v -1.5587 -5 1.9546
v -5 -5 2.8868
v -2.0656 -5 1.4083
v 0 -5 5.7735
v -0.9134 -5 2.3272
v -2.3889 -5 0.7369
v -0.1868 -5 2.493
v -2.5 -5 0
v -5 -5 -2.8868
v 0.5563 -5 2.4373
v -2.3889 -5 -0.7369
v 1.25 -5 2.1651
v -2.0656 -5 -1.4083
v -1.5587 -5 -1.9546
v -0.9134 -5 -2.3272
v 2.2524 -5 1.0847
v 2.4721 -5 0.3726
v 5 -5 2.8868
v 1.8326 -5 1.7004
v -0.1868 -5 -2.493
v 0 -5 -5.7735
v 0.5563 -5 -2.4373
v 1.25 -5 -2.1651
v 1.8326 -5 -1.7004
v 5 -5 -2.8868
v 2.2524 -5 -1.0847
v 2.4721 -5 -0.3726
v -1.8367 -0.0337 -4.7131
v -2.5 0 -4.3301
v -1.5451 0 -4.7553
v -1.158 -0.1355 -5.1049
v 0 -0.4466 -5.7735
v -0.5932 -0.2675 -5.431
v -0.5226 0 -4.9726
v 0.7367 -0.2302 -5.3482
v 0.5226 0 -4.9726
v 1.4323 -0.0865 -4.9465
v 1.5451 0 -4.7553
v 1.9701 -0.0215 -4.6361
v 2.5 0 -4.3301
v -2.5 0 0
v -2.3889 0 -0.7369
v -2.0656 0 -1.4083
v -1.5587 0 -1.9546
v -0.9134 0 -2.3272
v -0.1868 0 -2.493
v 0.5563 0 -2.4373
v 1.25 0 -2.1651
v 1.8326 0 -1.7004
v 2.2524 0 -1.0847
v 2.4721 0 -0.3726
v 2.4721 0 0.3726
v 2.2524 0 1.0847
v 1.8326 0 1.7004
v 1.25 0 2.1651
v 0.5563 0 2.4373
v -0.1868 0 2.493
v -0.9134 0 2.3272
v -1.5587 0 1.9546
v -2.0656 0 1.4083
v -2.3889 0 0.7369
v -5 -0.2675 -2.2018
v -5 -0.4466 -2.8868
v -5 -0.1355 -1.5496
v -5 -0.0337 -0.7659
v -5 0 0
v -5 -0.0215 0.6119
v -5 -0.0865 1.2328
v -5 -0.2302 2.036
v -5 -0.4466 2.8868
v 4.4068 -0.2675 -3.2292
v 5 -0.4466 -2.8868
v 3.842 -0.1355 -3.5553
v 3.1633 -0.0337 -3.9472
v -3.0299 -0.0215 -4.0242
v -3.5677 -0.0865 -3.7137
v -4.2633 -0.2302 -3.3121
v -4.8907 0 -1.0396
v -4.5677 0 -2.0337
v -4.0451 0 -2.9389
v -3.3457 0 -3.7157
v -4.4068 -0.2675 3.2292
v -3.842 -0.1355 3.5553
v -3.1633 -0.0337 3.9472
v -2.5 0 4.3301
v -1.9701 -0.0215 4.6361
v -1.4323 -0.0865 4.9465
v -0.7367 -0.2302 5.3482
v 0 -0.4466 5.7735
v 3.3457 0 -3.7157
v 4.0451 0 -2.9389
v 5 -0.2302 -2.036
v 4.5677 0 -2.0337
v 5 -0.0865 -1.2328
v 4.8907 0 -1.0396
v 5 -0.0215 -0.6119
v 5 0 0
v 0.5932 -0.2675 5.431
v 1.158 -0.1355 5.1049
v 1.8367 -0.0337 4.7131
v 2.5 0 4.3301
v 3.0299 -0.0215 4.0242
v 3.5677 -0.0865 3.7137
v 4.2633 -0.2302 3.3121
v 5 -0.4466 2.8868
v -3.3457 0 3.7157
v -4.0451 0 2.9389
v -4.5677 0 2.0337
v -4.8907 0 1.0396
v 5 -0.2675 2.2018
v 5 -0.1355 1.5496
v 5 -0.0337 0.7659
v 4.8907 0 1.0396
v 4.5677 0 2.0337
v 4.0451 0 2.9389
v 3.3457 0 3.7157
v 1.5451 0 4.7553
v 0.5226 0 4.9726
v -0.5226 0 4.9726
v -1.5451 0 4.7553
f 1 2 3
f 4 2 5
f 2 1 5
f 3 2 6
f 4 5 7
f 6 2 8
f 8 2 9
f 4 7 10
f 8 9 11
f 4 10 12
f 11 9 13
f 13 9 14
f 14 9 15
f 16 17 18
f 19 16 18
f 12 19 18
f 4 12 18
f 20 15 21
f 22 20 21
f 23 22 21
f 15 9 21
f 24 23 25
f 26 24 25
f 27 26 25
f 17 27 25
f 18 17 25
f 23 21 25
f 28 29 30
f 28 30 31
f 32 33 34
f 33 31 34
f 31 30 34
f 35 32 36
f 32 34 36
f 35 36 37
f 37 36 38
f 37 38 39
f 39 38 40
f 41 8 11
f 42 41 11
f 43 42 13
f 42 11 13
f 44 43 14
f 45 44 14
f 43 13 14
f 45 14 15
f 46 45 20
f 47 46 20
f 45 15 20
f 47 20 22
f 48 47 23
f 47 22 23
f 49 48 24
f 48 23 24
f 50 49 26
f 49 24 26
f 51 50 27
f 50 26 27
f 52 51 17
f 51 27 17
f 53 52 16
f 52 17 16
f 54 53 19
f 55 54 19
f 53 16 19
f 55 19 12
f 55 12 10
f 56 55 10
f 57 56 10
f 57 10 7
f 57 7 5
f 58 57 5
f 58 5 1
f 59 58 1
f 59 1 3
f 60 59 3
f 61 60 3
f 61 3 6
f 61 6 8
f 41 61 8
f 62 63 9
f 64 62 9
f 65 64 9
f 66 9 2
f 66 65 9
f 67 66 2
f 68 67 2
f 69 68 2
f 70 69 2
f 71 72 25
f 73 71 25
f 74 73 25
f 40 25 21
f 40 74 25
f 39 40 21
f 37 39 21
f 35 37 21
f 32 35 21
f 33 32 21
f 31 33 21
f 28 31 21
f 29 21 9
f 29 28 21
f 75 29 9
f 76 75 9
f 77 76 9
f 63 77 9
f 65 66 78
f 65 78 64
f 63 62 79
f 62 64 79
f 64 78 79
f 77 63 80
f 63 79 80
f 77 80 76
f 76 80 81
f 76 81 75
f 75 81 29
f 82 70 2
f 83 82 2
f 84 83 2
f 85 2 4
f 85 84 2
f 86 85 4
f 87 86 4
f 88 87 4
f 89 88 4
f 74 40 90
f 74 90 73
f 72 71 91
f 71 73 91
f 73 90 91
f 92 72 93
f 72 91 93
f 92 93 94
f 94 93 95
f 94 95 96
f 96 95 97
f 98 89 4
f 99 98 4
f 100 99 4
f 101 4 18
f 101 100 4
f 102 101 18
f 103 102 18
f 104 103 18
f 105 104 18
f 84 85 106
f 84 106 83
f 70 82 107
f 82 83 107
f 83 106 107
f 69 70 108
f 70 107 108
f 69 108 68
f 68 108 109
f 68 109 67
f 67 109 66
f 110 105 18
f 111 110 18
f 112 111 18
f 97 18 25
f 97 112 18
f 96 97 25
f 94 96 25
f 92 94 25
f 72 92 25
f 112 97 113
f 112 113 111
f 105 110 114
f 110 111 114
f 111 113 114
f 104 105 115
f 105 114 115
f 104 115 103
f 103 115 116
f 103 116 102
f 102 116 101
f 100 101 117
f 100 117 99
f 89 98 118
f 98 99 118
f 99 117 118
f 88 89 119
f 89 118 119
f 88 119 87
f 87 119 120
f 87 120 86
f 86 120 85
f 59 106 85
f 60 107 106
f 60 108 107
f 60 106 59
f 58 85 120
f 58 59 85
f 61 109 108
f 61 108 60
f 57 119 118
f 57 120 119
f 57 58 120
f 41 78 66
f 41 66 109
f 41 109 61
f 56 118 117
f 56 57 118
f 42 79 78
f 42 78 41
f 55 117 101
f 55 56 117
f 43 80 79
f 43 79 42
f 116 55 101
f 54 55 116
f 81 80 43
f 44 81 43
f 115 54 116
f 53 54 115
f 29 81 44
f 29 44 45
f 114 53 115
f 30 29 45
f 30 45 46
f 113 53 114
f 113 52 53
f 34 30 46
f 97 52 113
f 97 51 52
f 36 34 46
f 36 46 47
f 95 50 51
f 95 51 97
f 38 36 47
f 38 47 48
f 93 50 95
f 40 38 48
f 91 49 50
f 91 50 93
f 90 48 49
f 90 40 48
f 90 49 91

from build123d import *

# Parameters (mm, degrees)
BOSS_EXTRUDE1_DEPTH = 5
TAPPED_HOLE1_D      = 5


with BuildPart() as part:
    # Sketch1 → Boss-Extrude1 (new body)
    with BuildSketch(Plane(origin=(0, 0, 0), x_dir=(1, 0, 0), z_dir=(0, 1, 0))):
        Polygon((0, 5.773502692), (-5, 2.886751346), (-5, -2.886751346), (0, -5.773502692), (5, -2.886751346), (5, 2.886751346), align=None)
    extrude(amount=-BOSS_EXTRUDE1_DEPTH)

    # Sketch2 → Cut-Revolve1 (revolve, cut)
    with BuildSketch(Plane(origin=(0, 0, 0), x_dir=(0, 0, -1), z_dir=(1, 0, 0))):
        Polygon((5, 0), (5.773502692, 0), (5.773502692, -0.446581987), align=None)
    revolve(axis=Axis((0, 0, 0), (0, -1, 0)), mode=Mode.SUBTRACT)

    # Tapped Hole1 (through all)
    with Locations(Plane(origin=(0, 0, 0), x_dir=(1, 0, 0), z_dir=(0, 1, 0))):
        with Locations((0, 0)):
            Hole(TAPPED_HOLE1_D / 2)


solid = part.part
